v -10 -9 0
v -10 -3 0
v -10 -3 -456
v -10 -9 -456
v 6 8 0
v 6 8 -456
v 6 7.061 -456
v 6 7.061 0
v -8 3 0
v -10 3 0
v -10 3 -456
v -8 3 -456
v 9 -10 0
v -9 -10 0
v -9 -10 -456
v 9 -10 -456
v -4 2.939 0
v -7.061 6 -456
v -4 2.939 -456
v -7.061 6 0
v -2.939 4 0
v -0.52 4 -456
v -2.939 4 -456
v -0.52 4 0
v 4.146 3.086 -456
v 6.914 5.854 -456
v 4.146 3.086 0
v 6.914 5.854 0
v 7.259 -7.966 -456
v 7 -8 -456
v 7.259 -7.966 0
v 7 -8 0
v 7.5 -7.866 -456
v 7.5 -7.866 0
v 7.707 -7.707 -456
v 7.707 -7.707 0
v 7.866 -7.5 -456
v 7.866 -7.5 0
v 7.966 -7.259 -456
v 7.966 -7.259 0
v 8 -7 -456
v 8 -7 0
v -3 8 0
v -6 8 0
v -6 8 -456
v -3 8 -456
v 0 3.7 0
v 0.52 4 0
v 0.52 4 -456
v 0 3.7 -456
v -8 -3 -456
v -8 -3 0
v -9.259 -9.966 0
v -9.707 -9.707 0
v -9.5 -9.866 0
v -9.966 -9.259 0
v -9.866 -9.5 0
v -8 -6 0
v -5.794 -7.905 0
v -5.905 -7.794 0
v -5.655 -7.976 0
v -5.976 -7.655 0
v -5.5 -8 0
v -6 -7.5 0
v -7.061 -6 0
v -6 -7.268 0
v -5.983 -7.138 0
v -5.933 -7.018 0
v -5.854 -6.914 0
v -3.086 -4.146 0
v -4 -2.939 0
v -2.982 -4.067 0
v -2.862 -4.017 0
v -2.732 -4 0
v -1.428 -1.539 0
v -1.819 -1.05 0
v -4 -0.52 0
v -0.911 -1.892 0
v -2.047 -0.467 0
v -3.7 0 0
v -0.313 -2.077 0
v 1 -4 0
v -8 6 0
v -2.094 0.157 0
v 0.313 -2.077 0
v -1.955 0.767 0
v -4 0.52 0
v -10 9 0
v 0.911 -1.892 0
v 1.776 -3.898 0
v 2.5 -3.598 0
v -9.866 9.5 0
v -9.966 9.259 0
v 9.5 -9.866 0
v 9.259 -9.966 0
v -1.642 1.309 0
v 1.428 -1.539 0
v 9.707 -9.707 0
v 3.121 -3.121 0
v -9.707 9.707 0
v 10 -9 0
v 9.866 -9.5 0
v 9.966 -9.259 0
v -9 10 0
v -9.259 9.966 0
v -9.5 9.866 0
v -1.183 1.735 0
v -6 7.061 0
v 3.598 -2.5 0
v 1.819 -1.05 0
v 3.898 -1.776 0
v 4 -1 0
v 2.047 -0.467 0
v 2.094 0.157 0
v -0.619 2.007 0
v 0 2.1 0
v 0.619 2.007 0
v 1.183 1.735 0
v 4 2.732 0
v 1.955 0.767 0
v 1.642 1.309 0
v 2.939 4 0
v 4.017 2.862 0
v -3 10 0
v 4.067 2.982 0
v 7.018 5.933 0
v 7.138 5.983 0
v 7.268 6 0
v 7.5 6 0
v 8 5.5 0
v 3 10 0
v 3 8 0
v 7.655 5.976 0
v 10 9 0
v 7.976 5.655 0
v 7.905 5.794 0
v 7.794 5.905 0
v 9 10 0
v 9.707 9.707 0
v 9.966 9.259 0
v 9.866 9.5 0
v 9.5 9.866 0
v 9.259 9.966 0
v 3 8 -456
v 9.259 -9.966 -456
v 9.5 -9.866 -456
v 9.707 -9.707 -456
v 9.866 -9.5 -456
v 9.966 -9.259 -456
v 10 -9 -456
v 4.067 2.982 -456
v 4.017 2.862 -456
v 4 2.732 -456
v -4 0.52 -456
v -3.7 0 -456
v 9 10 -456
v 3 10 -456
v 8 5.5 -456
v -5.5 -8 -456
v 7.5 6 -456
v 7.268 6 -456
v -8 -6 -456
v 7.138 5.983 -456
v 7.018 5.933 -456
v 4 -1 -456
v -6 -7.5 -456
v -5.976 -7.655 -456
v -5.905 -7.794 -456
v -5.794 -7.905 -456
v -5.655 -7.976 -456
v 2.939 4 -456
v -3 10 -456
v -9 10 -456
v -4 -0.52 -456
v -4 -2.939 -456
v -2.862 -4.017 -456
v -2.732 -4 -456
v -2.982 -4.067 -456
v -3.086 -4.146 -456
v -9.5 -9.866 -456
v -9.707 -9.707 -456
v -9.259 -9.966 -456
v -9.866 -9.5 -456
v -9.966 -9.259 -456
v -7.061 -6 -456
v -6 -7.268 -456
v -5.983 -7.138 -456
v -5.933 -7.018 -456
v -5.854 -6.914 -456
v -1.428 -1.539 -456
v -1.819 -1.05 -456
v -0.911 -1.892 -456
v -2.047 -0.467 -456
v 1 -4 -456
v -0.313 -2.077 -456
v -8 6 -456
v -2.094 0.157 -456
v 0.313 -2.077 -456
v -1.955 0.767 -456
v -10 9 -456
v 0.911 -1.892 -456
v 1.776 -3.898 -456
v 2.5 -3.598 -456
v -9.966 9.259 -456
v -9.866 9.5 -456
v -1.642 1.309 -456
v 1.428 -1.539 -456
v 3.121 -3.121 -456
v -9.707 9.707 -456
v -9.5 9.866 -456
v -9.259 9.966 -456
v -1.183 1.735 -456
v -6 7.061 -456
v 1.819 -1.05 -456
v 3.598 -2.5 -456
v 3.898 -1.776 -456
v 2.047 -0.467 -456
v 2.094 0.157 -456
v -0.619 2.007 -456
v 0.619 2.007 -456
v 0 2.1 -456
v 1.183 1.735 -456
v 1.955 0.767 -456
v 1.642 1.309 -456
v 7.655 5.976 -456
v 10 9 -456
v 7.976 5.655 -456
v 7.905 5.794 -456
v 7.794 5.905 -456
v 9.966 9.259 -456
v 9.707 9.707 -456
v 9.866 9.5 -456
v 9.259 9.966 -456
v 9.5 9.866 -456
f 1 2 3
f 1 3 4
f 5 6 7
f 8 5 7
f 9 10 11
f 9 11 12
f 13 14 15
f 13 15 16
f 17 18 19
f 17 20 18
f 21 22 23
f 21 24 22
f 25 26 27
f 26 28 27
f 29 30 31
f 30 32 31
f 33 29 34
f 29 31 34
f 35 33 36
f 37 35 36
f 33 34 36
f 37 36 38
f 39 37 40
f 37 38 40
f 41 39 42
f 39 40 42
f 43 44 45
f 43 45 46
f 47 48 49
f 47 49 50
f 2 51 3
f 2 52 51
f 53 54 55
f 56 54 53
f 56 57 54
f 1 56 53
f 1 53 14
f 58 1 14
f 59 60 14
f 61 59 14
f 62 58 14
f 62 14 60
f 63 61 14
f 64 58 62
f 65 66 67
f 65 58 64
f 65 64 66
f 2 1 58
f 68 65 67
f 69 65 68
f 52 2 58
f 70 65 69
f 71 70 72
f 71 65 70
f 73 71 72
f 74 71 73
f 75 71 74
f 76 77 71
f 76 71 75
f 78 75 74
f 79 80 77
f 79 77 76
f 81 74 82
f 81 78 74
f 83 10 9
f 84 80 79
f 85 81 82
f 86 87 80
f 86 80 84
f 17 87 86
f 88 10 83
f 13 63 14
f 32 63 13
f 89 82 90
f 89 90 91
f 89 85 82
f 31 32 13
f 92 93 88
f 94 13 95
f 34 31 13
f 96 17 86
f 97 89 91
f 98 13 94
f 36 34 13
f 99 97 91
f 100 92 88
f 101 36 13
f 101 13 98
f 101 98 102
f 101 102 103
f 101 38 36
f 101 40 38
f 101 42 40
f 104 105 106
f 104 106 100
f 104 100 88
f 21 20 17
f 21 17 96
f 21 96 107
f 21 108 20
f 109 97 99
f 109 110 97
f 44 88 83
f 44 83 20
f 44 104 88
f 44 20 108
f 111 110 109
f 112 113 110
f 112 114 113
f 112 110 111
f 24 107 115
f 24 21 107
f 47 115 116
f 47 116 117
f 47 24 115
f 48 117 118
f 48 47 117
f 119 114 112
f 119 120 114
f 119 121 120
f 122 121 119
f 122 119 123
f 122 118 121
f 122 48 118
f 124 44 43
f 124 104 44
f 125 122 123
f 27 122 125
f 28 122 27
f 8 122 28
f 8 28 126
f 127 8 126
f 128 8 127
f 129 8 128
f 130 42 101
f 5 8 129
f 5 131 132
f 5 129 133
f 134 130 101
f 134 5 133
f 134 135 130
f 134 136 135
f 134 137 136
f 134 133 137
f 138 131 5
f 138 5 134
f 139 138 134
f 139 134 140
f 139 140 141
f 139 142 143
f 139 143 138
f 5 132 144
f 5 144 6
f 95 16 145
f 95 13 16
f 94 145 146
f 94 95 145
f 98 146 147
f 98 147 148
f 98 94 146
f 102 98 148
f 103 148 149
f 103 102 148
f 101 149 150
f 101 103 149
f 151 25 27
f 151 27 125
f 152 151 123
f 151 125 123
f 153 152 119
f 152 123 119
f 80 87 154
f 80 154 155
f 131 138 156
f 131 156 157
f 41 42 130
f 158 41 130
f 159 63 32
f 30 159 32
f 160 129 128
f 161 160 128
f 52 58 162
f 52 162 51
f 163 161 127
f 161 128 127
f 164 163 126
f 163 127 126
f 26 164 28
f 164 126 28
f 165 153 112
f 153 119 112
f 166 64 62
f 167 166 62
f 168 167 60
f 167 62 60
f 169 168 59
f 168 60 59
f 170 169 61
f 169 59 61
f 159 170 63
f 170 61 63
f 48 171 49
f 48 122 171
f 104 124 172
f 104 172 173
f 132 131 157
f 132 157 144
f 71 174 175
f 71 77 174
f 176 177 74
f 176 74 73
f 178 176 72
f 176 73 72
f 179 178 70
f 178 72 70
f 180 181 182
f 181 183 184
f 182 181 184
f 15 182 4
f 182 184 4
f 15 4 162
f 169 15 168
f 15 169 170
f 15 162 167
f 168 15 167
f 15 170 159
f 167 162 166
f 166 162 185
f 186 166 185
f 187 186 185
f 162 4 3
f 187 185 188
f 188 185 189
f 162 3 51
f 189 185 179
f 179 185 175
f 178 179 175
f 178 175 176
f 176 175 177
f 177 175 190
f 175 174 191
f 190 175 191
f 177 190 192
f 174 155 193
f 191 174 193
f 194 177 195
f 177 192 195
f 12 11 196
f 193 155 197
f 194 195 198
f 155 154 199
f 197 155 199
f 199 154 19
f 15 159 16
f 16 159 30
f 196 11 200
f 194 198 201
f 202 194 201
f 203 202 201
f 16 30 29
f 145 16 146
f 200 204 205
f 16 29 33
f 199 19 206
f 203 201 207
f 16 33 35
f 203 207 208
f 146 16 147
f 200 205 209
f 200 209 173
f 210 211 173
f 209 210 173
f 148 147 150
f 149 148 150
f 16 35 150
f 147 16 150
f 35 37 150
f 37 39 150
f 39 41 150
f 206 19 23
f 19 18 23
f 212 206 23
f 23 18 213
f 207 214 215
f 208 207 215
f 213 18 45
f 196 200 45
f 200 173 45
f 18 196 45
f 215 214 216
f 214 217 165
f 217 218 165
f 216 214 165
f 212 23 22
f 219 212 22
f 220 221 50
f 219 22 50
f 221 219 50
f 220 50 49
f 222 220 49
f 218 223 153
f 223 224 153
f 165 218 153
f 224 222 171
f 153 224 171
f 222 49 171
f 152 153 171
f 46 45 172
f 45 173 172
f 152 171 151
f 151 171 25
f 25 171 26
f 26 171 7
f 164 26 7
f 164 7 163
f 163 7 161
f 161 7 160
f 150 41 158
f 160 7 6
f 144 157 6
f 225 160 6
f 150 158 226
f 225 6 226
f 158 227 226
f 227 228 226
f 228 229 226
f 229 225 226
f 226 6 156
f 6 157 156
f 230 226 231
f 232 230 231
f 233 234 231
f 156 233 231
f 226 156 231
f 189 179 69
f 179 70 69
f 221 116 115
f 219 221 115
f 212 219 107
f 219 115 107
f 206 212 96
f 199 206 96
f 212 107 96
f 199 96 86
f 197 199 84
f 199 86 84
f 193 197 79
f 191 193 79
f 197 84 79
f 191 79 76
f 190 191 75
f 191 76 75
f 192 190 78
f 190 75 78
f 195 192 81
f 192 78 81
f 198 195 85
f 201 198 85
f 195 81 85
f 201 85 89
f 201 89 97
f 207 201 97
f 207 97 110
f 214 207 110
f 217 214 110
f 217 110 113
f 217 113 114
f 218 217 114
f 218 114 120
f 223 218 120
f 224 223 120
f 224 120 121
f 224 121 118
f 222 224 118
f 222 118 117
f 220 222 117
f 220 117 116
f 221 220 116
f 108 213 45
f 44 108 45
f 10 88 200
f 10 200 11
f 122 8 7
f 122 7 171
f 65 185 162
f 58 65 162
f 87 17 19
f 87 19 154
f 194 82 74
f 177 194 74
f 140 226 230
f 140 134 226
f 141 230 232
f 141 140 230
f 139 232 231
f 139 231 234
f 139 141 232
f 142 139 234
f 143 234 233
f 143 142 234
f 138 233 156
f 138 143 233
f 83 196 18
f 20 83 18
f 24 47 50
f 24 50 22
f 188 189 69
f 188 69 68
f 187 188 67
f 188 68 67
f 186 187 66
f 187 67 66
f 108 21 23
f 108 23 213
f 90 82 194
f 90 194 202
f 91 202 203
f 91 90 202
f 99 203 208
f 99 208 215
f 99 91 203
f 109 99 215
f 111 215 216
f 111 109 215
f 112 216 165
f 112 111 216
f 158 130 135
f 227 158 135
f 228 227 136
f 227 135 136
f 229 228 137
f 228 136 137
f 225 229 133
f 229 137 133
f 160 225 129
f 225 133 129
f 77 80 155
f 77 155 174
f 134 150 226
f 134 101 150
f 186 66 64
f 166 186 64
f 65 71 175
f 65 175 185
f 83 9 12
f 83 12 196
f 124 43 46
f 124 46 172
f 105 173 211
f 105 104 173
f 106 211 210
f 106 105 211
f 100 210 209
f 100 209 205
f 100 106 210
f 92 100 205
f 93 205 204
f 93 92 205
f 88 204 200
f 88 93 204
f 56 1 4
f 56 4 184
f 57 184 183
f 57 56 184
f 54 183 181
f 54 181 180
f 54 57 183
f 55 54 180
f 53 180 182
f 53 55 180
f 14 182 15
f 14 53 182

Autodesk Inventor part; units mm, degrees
sketch "Sketch_64" plane through (0, 0, 0) normal (0, 0, 1) x (1, 0, 0)
  line L0 (-10, -3) -> (-10, -9)
  arc A0 (-10, -9) -> (-9, -10) centre (-9, -9) ccw
  line L1 (-9, -10) -> (9, -10)
  arc A1 (9, -10) -> (10, -9) centre (9, -9) ccw
  line L2 (10, -9) -> (10, 9)
  arc A2 (10, 9) -> (9, 10) centre (9, 9) ccw
  line L3 (9, 10) -> (3, 10)
  line L4 (3, 10) -> (3, 8)
  line L5 (3, 8) -> (6, 8)
  line L6 (6, 8) -> (6, 7.0607)
  line L7 (6, 7.0607) -> (2.9393, 4)
  line L8 (2.9393, 4) -> (0.5196, 4)
  line L9 (0.5196, 4) -> (0, 3.7)
  line L10 (0, 3.7) -> (-0.5196, 4)
  line L11 (-0.5196, 4) -> (-2.9393, 4)
  line L12 (-2.9393, 4) -> (-6, 7.0607)
  line L13 (-6, 7.0607) -> (-6, 8)
  line L14 (-6, 8) -> (-3, 8)
  line L15 (-3, 8) -> (-3, 10)
  line L16 (-3, 10) -> (-9, 10)
  arc A3 (-9, 10) -> (-10, 9) centre (-9, 9) ccw
  line L17 (-10, 9) -> (-10, 3)
  line L18 (-10, 3) -> (-8, 3)
  line L19 (-8, 3) -> (-8, 6)
  line L20 (-8, 6) -> (-7.0607, 6)
  line L21 (-7.0607, 6) -> (-4, 2.9393)
  line L22 (-4, 2.9393) -> (-4, 0.5196)
  line L23 (-4, 0.5196) -> (-3.7, 0)
  line L24 (-3.7, 0) -> (-4, -0.5196)
  line L25 (-4, -0.5196) -> (-4, -2.9393)
  line L26 (-4, -2.9393) -> (-7.0607, -6)
  line L27 (-7.0607, -6) -> (-8, -6)
  line L28 (-8, -6) -> (-8, -3)
  line L29 (-8, -3) -> (-10, -3)
  line L30 (-6, -7.2678) -> (-6, -7.5)
  arc A4 (-6, -7.5) -> (-5.5, -8) centre (-5.5, -7.5) ccw
  line L31 (-5.5, -8) -> (7, -8)
  arc A5 (7, -8) -> (8, -7) centre (7, -7) ccw
  line L32 (8, -7) -> (8, 5.5)
  arc A6 (8, 5.5) -> (7.5, 6) centre (7.5, 5.5) ccw
  line L33 (7.5, 6) -> (7.2678, 6)
  arc A7 (7.2678, 6) -> (6.9142, 5.8536) centre (7.2678, 5.5) ccw
  line L34 (6.9142, 5.8536) -> (4.1464, 3.0858)
  arc A8 (4.1464, 3.0858) -> (4, 2.7322) centre (4.5, 2.7322) ccw
  line L35 (4, 2.7322) -> (4, -1)
  arc A9 (1, -4) -> (4, -1) centre (1, -1) ccw
  line L36 (1, -4) -> (-2.7322, -4)
  arc A10 (-2.7322, -4) -> (-3.0858, -4.1464) centre (-2.7322, -4.5) ccw
  line L37 (-3.0858, -4.1464) -> (-5.8536, -6.9142)
  arc A11 (-5.8536, -6.9142) -> (-6, -7.2678) centre (-5.5, -7.2678) ccw
extrude "Extrusion1" add sketch "Sketch_64" against normal blind 456
sketch "Sketch2" plane through (0, 0, -456) normal (0, 0, -1) x (-1, 0, 0)
  point P0 (0, 0)
hole "Hole1" at (0, 0, -456) direction (0, 0, 1) diameter 4.2 depth 456
ref_plane "C1_XY" through (0, 0, 0) normal (0, 0, 1) x (1, 0, 0)
ref_plane "C1_YZ" through (0, 0, 0) normal (1, 0, 0) x (0, 1, 0)
ref_plane "C1_ZX" through (0, 0, 0) normal (0, 1, 0) x (0, 0, 1)
thread "Thread1" size "M5x0.8" class "6H" standard "ANSI Metric M Profile" length 10
thread "Thread2" size "M4.5x0.75" class "6H" standard "ANSI Metric M Profile" length 10
properties part number "HFSTB5-2020-456" material "Aluminum 6061"
